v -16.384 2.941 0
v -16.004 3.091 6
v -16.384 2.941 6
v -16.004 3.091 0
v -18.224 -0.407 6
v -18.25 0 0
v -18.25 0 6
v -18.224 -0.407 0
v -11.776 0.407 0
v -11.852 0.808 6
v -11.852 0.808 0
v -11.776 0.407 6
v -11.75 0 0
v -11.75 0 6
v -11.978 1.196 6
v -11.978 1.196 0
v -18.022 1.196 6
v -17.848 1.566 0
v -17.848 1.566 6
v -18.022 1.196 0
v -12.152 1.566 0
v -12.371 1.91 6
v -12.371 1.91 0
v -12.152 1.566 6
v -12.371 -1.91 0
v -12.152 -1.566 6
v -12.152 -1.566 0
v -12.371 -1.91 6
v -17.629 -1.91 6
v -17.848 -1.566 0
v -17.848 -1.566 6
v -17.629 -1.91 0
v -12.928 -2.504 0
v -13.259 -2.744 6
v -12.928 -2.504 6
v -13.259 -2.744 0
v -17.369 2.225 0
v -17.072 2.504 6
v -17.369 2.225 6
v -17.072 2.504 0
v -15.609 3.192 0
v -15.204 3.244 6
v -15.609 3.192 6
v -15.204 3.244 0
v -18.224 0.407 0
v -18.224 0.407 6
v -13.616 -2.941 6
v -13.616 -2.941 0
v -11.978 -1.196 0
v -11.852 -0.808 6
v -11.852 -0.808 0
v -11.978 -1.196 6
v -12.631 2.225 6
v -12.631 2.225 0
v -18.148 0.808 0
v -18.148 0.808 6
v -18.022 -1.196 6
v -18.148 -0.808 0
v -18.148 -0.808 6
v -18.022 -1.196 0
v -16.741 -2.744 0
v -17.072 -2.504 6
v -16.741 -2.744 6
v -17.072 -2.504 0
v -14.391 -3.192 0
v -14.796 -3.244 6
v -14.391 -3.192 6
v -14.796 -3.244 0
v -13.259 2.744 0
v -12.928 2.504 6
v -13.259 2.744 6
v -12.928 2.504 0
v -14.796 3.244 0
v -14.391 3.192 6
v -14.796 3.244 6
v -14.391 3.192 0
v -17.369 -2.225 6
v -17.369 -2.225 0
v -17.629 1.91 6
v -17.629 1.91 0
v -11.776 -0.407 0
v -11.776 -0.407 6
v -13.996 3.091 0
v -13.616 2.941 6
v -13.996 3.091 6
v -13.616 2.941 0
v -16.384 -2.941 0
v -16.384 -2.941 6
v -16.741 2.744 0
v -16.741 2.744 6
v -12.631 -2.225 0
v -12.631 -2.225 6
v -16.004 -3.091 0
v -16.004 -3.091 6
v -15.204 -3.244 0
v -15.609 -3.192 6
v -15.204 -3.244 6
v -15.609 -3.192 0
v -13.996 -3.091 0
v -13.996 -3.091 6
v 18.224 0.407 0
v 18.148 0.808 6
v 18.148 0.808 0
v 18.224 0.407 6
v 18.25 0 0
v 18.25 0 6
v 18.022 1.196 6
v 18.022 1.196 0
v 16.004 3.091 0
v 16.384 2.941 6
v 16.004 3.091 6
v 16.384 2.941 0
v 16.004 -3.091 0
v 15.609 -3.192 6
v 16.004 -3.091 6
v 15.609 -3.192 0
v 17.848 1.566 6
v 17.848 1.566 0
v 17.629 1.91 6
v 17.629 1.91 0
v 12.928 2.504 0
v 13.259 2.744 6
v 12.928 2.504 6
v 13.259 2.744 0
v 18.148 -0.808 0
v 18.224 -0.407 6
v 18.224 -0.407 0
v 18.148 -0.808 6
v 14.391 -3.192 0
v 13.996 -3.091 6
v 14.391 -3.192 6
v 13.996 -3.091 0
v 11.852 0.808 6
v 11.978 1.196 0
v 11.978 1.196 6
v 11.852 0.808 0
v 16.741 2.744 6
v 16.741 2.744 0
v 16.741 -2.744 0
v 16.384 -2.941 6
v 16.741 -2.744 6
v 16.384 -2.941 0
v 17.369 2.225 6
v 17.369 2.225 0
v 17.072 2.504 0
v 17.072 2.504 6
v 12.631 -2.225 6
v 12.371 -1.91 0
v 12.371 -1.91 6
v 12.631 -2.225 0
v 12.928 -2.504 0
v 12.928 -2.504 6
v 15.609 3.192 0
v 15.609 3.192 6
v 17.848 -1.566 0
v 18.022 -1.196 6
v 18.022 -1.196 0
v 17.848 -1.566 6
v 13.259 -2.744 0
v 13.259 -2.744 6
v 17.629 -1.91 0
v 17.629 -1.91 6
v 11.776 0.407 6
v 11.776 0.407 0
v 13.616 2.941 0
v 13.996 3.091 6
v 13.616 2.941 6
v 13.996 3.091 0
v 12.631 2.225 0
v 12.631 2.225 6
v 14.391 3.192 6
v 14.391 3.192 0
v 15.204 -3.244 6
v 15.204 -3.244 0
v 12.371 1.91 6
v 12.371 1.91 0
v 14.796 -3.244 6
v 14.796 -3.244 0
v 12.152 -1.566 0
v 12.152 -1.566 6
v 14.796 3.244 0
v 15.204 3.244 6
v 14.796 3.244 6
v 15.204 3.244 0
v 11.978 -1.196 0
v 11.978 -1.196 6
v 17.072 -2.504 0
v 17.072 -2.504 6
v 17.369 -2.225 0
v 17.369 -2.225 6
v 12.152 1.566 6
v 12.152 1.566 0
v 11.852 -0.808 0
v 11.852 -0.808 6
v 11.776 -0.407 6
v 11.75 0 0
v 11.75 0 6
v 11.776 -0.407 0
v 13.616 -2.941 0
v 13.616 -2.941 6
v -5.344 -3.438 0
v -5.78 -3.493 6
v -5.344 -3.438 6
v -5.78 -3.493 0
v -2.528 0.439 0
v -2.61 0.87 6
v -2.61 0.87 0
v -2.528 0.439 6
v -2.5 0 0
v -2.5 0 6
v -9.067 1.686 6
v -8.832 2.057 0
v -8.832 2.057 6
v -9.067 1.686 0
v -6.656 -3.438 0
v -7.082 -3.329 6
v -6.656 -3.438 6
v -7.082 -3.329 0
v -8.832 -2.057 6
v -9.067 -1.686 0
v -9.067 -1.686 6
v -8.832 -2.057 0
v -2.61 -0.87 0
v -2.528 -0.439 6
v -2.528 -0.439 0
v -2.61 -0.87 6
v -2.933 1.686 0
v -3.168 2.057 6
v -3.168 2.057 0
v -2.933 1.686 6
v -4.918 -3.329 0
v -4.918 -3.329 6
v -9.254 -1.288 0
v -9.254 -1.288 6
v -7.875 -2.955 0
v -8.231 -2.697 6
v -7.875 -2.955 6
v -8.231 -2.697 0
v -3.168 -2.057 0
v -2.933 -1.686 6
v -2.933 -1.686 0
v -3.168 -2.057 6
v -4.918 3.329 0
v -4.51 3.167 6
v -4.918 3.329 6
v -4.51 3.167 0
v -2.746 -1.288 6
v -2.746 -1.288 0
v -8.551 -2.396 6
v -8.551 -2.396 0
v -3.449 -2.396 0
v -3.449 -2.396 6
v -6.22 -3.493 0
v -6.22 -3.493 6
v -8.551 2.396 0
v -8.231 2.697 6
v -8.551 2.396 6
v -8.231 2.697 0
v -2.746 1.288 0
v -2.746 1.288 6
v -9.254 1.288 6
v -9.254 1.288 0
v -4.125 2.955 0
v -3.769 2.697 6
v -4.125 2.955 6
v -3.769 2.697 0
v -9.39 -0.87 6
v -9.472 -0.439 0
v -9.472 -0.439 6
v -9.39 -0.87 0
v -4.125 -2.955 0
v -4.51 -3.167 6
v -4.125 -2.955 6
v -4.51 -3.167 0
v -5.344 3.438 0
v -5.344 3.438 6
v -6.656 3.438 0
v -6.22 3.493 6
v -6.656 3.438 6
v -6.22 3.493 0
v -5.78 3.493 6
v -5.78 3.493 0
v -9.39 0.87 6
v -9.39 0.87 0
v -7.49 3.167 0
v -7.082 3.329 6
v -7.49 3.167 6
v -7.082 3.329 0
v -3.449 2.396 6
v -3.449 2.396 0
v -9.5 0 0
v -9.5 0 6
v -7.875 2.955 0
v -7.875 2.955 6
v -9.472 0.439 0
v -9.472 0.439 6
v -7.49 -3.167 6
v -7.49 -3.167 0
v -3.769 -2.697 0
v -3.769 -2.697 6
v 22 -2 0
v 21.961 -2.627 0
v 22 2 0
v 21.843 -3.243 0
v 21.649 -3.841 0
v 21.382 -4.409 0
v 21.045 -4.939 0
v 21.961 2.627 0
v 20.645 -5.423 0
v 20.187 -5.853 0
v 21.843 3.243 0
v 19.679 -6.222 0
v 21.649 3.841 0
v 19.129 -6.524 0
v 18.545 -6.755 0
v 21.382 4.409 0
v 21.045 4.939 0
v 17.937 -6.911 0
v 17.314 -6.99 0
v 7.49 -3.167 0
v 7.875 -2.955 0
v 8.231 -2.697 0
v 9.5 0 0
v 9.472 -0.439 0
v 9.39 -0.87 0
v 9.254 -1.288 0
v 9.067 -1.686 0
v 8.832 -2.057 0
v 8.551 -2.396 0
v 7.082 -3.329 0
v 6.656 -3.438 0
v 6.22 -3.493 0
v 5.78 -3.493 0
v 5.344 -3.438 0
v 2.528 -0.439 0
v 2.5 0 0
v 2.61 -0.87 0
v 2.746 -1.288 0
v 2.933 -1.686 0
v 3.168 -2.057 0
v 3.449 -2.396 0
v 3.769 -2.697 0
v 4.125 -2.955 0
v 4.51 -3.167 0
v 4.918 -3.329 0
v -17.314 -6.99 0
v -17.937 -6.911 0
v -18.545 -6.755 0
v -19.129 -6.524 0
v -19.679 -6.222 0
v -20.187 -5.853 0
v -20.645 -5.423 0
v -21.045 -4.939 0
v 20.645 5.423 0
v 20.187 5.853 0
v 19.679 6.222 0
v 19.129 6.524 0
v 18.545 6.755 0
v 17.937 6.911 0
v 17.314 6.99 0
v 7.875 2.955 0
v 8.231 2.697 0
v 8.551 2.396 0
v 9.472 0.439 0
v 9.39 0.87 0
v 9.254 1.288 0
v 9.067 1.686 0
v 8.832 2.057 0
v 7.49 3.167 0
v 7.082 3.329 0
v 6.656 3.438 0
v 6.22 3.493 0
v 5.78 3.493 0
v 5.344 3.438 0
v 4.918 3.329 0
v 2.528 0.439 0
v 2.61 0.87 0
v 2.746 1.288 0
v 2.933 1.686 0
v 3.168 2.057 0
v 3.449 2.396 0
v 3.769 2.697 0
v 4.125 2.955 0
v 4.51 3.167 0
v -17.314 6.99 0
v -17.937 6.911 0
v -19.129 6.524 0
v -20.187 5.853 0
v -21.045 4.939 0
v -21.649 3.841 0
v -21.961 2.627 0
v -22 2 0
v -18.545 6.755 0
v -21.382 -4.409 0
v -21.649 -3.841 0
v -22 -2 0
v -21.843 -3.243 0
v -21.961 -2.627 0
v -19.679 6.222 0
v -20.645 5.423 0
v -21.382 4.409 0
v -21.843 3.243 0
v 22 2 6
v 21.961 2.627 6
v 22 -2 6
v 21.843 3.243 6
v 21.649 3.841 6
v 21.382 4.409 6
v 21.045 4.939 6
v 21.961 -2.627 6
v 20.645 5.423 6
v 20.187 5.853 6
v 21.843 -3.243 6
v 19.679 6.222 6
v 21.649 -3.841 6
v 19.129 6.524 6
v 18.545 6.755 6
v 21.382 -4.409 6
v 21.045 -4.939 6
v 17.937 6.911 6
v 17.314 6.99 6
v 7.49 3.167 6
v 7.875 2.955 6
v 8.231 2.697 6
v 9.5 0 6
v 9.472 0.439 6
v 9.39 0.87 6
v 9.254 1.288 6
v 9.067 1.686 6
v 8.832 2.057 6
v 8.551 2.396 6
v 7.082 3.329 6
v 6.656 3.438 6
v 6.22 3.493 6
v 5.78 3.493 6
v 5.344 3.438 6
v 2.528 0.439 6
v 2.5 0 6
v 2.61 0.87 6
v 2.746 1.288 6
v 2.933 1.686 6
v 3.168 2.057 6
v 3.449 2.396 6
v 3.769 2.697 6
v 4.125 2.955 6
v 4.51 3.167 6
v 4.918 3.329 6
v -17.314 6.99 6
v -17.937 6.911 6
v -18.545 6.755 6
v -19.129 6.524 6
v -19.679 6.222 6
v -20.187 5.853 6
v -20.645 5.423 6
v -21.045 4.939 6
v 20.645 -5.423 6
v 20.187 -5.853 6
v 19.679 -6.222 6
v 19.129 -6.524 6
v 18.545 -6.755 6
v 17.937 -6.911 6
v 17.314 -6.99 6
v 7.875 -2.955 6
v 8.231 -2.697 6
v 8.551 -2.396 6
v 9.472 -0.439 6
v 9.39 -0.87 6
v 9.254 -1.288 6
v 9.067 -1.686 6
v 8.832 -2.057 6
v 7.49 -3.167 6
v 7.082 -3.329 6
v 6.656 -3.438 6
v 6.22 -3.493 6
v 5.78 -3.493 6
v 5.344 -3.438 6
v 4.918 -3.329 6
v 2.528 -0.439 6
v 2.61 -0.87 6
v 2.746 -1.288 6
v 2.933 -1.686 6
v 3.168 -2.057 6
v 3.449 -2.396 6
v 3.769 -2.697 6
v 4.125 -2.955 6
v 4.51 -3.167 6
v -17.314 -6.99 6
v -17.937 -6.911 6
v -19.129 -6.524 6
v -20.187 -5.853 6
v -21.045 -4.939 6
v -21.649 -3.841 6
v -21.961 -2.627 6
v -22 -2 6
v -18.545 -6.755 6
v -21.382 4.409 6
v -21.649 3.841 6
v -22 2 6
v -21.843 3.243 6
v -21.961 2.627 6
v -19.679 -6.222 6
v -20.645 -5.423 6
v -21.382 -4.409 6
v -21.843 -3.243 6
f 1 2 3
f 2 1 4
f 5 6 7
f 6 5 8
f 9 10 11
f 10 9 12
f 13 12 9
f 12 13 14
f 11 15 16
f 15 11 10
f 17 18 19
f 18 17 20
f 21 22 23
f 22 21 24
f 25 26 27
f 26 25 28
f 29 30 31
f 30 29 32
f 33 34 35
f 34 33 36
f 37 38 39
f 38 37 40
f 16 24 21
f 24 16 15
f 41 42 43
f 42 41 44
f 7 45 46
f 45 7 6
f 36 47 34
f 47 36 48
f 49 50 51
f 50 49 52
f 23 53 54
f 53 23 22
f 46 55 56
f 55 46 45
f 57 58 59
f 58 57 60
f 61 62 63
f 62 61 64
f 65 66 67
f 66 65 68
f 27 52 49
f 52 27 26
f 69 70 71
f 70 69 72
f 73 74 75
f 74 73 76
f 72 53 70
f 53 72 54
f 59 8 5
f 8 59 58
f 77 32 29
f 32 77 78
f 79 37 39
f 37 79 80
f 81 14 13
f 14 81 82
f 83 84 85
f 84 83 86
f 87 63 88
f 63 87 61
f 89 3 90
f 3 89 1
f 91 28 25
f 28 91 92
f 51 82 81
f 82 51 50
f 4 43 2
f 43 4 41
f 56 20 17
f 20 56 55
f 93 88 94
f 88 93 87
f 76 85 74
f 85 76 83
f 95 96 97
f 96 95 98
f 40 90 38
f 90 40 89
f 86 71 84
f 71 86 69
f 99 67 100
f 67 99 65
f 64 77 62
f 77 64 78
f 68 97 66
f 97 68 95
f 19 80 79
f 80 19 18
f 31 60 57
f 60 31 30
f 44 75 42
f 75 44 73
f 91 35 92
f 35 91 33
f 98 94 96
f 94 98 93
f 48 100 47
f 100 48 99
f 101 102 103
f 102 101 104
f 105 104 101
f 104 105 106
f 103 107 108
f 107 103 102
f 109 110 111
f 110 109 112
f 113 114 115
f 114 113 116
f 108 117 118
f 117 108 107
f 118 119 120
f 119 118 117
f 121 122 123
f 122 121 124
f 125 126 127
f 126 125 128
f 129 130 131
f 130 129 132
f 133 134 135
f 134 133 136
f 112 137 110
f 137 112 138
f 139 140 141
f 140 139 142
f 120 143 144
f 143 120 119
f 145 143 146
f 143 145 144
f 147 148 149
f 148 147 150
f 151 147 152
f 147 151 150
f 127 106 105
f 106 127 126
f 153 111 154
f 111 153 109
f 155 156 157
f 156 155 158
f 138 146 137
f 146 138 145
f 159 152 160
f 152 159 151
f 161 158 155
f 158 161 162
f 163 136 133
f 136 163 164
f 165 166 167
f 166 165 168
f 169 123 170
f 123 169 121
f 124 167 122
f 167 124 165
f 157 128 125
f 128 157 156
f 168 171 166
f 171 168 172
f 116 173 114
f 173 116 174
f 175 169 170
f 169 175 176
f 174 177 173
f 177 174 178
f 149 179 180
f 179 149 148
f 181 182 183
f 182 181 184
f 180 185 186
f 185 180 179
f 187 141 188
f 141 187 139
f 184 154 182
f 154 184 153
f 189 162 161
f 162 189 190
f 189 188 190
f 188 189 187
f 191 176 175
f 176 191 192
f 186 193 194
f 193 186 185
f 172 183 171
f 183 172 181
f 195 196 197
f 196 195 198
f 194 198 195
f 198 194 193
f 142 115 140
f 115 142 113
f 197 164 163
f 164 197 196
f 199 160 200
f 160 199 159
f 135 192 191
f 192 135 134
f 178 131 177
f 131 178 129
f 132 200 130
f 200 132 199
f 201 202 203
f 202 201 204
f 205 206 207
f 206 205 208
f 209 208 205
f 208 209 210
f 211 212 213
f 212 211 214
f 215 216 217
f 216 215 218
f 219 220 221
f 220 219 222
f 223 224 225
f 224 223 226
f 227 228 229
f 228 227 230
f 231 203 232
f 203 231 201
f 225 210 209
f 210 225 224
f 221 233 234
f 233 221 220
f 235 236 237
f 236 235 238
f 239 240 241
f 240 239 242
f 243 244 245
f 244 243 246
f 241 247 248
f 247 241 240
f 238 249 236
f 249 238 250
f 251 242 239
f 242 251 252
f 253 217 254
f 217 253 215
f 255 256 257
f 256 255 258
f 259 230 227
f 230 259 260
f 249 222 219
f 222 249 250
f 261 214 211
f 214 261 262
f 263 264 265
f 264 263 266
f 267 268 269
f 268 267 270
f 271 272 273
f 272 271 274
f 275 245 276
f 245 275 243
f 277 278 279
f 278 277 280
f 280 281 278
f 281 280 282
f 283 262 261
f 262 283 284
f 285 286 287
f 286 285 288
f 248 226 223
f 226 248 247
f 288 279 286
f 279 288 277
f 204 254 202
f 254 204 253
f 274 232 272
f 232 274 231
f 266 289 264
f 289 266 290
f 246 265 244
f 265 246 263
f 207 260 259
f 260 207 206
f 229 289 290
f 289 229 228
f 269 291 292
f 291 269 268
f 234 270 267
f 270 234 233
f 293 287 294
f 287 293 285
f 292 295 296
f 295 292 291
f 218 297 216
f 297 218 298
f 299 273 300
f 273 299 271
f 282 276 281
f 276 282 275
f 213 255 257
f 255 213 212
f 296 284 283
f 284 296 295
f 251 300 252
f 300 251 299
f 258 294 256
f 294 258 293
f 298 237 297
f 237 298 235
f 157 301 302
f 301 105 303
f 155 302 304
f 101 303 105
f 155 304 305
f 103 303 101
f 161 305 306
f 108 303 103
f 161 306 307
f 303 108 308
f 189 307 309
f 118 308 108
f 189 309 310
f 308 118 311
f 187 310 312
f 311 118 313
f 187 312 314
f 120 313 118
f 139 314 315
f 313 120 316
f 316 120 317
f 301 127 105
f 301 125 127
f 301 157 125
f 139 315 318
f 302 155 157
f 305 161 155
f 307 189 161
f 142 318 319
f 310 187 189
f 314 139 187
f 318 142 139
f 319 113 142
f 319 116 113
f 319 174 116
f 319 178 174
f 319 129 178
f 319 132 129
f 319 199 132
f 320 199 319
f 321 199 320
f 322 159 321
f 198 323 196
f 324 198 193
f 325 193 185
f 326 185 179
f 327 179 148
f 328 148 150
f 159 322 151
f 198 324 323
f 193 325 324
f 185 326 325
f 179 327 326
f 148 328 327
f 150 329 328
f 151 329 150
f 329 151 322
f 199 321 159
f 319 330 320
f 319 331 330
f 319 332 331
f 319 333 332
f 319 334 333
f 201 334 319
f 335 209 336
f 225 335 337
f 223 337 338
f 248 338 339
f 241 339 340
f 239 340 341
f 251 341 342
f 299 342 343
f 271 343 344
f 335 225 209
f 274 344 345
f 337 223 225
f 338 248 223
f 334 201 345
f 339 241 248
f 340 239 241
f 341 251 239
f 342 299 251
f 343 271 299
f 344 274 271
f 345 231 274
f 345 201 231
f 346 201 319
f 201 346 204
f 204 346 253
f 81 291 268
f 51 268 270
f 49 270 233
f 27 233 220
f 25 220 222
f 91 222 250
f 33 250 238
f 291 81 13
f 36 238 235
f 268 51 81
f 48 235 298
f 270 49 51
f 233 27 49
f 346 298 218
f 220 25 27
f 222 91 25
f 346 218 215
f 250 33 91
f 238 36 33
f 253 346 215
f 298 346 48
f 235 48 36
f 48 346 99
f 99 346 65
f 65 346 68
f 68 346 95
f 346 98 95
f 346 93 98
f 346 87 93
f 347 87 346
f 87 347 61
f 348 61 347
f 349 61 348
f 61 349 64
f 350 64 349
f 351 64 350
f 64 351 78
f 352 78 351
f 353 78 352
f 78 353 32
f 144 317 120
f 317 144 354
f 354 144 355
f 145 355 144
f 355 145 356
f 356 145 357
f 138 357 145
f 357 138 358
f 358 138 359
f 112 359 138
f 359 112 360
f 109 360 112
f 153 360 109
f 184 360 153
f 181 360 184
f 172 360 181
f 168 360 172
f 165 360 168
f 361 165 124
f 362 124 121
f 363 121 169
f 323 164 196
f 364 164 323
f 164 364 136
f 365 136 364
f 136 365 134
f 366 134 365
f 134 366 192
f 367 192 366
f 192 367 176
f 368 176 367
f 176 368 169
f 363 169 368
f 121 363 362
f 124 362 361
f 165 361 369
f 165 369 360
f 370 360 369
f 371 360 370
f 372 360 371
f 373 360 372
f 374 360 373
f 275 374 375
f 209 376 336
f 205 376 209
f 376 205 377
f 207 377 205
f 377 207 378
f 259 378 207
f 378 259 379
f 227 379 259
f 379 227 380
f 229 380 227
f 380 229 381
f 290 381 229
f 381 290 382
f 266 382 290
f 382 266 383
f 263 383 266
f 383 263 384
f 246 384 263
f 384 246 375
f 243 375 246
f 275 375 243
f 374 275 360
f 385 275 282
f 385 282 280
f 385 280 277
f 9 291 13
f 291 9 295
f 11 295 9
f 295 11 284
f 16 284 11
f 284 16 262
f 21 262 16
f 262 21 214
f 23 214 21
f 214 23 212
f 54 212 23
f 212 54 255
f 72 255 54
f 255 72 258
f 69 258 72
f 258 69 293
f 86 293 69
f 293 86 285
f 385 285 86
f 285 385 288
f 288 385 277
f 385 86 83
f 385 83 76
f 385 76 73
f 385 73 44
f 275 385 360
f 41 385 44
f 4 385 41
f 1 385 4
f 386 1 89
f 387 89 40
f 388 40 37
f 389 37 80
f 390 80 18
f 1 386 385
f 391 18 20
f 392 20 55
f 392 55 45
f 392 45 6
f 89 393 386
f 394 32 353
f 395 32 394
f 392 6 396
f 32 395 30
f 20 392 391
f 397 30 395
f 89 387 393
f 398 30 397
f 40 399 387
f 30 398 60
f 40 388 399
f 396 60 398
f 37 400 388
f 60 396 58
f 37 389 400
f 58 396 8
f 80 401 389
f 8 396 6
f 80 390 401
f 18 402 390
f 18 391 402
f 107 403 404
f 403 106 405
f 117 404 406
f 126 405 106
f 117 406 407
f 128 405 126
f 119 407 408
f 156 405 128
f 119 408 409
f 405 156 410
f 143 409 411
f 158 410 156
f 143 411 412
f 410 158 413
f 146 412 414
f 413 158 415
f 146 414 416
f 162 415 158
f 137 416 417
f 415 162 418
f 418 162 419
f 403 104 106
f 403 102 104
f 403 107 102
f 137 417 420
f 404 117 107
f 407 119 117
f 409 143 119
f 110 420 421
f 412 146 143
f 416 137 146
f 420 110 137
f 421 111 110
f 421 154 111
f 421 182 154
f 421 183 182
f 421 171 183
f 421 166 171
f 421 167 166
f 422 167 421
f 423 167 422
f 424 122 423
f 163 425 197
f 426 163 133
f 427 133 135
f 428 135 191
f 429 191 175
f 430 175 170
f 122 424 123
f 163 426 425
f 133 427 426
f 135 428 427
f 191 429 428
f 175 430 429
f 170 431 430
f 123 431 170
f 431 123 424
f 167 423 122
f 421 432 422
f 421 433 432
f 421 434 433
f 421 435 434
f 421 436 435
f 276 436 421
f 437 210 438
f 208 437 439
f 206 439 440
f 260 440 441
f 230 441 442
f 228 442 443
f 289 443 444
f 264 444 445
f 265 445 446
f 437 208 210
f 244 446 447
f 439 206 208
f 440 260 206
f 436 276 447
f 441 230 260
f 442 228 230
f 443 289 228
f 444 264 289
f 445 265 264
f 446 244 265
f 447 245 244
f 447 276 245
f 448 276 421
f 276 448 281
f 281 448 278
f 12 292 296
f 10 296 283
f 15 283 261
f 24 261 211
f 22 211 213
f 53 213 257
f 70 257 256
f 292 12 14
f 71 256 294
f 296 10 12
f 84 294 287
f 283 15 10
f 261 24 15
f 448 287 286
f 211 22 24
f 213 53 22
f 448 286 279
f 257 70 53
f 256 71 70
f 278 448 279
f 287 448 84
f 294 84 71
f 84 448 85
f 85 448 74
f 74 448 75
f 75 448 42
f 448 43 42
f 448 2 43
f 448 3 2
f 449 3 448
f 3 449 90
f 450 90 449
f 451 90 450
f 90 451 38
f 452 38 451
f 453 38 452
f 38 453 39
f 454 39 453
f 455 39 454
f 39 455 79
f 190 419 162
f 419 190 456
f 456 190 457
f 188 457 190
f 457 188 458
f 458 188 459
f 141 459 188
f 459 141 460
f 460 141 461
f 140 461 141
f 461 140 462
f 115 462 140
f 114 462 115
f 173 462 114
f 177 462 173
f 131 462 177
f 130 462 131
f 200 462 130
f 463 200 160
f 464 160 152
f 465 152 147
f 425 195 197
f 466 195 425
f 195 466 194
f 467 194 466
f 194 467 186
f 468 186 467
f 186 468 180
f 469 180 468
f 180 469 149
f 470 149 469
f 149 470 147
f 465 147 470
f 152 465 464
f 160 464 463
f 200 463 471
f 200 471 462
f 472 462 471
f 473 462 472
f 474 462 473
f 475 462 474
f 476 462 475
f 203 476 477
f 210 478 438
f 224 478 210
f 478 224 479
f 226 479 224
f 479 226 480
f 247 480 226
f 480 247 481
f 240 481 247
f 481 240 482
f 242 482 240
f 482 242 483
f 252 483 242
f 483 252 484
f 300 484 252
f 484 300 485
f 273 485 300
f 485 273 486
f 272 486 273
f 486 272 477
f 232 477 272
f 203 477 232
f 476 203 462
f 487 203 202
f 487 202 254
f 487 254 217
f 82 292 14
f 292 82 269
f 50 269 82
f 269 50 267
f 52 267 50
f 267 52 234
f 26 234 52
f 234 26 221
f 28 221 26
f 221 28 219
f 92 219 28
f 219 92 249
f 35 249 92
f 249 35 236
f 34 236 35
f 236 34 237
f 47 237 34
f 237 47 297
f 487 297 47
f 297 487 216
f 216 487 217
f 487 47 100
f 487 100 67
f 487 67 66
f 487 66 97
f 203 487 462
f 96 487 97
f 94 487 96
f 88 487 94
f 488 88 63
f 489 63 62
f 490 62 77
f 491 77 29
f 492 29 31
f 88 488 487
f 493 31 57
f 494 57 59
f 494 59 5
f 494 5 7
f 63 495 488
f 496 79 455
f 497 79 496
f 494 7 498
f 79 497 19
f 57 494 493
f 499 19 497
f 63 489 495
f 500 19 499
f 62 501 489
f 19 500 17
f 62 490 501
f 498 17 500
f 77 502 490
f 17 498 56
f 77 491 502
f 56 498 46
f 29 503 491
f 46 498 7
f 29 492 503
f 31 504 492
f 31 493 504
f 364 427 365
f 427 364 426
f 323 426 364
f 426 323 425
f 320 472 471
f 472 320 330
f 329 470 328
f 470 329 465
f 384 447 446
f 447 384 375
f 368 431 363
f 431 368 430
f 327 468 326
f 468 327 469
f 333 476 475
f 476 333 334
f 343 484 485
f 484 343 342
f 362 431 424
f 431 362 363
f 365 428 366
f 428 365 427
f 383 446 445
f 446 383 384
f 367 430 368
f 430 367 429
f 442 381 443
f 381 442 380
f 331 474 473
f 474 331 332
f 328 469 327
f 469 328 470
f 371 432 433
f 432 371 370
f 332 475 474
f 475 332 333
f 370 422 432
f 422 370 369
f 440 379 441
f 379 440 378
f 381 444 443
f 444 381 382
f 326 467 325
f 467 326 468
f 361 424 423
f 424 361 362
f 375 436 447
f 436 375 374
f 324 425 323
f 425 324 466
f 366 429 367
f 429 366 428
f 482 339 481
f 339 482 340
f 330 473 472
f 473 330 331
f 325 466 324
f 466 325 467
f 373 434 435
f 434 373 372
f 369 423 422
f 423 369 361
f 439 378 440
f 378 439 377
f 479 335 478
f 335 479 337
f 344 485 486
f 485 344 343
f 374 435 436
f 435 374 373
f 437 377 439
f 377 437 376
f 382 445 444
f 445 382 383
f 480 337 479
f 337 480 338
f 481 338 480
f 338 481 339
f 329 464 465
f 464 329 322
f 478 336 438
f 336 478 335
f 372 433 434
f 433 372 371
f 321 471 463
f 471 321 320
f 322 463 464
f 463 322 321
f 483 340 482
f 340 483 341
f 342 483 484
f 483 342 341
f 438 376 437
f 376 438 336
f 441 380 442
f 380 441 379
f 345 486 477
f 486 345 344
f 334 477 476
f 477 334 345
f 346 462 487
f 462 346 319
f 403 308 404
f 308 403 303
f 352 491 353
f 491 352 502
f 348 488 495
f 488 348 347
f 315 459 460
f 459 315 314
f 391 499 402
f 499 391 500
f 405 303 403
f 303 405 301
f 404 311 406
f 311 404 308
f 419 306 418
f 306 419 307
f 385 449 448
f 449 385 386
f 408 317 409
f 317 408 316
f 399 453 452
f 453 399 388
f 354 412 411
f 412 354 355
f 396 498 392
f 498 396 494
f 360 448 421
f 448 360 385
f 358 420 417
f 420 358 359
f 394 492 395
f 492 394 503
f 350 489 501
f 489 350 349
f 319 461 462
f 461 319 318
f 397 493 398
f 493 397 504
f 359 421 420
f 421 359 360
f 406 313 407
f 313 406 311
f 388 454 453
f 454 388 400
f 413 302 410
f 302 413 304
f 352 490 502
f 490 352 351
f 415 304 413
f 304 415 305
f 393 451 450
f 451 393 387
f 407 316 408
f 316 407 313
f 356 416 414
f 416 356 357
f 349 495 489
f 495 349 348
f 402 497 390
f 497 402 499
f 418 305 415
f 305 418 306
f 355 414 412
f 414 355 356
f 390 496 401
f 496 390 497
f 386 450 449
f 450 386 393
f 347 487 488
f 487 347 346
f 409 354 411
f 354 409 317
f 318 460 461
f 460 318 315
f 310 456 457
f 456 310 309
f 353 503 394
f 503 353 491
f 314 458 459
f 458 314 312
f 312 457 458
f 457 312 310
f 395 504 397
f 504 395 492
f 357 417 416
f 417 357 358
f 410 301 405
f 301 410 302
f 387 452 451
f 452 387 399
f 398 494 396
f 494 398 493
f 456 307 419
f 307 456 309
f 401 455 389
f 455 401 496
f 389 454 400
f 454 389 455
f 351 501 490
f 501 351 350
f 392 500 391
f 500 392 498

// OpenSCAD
$fn = 50;


difference() {
	union() {
		hull() {
			translate(v = [-17.0000000000, 2.0000000000, 0]) {
				cylinder(h = 6, r = 5);
			}
			translate(v = [17.0000000000, 2.0000000000, 0]) {
				cylinder(h = 6, r = 5);
			}
			translate(v = [-17.0000000000, -2.0000000000, 0]) {
				cylinder(h = 6, r = 5);
			}
			translate(v = [17.0000000000, -2.0000000000, 0]) {
				cylinder(h = 6, r = 5);
			}
		}
	}
	union() {
		#translate(v = [-15.0000000000, 0.0000000000, 0]) {
			cylinder(h = 6, r = 3.2500000000);
		}
		#translate(v = [15.0000000000, 0.0000000000, 0]) {
			cylinder(h = 6, r = 3.2500000000);
		}
		#translate(v = [-15.0000000000, 0.0000000000, -100.0000000000]) {
			cylinder(h = 200, r = 3.2500000000);
		}
		#translate(v = [-15.0000000000, 0.0000000000, -100.0000000000]) {
			cylinder(h = 200, r = 3.2500000000);
		}
		#translate(v = [15.0000000000, 0.0000000000, -100.0000000000]) {
			cylinder(h = 200, r = 3.2500000000);
		}
		#translate(v = [15.0000000000, 0.0000000000, -100.0000000000]) {
			cylinder(h = 200, r = 3.2500000000);
		}
		#translate(v = [-15.0000000000, 0.0000000000, 0]) {
			cylinder(h = 6, r = 1.8000000000);
		}
		#translate(v = [15.0000000000, 0.0000000000, 0]) {
			cylinder(h = 6, r = 1.8000000000);
		}
		#translate(v = [-15.0000000000, 0.0000000000, 0]) {
			cylinder(h = 6, r = 1.8000000000);
		}
		#translate(v = [15.0000000000, 0.0000000000, 0]) {
			cylinder(h = 6, r = 1.8000000000);
		}
		#translate(v = [-15.0000000000, 0.0000000000, 0]) {
			cylinder(h = 6, r = 1.8000000000);
		}
		#translate(v = [15.0000000000, 0.0000000000, 0]) {
			cylinder(h = 6, r = 1.8000000000);
		}
		#translate(v = [-6.0000000000, 0, 0]) {
			cylinder(h = 6, r = 3.5000000000);
		}
		#translate(v = [6.0000000000, 0, 0]) {
			cylinder(h = 6, r = 3.5000000000);
		}
	}
}
